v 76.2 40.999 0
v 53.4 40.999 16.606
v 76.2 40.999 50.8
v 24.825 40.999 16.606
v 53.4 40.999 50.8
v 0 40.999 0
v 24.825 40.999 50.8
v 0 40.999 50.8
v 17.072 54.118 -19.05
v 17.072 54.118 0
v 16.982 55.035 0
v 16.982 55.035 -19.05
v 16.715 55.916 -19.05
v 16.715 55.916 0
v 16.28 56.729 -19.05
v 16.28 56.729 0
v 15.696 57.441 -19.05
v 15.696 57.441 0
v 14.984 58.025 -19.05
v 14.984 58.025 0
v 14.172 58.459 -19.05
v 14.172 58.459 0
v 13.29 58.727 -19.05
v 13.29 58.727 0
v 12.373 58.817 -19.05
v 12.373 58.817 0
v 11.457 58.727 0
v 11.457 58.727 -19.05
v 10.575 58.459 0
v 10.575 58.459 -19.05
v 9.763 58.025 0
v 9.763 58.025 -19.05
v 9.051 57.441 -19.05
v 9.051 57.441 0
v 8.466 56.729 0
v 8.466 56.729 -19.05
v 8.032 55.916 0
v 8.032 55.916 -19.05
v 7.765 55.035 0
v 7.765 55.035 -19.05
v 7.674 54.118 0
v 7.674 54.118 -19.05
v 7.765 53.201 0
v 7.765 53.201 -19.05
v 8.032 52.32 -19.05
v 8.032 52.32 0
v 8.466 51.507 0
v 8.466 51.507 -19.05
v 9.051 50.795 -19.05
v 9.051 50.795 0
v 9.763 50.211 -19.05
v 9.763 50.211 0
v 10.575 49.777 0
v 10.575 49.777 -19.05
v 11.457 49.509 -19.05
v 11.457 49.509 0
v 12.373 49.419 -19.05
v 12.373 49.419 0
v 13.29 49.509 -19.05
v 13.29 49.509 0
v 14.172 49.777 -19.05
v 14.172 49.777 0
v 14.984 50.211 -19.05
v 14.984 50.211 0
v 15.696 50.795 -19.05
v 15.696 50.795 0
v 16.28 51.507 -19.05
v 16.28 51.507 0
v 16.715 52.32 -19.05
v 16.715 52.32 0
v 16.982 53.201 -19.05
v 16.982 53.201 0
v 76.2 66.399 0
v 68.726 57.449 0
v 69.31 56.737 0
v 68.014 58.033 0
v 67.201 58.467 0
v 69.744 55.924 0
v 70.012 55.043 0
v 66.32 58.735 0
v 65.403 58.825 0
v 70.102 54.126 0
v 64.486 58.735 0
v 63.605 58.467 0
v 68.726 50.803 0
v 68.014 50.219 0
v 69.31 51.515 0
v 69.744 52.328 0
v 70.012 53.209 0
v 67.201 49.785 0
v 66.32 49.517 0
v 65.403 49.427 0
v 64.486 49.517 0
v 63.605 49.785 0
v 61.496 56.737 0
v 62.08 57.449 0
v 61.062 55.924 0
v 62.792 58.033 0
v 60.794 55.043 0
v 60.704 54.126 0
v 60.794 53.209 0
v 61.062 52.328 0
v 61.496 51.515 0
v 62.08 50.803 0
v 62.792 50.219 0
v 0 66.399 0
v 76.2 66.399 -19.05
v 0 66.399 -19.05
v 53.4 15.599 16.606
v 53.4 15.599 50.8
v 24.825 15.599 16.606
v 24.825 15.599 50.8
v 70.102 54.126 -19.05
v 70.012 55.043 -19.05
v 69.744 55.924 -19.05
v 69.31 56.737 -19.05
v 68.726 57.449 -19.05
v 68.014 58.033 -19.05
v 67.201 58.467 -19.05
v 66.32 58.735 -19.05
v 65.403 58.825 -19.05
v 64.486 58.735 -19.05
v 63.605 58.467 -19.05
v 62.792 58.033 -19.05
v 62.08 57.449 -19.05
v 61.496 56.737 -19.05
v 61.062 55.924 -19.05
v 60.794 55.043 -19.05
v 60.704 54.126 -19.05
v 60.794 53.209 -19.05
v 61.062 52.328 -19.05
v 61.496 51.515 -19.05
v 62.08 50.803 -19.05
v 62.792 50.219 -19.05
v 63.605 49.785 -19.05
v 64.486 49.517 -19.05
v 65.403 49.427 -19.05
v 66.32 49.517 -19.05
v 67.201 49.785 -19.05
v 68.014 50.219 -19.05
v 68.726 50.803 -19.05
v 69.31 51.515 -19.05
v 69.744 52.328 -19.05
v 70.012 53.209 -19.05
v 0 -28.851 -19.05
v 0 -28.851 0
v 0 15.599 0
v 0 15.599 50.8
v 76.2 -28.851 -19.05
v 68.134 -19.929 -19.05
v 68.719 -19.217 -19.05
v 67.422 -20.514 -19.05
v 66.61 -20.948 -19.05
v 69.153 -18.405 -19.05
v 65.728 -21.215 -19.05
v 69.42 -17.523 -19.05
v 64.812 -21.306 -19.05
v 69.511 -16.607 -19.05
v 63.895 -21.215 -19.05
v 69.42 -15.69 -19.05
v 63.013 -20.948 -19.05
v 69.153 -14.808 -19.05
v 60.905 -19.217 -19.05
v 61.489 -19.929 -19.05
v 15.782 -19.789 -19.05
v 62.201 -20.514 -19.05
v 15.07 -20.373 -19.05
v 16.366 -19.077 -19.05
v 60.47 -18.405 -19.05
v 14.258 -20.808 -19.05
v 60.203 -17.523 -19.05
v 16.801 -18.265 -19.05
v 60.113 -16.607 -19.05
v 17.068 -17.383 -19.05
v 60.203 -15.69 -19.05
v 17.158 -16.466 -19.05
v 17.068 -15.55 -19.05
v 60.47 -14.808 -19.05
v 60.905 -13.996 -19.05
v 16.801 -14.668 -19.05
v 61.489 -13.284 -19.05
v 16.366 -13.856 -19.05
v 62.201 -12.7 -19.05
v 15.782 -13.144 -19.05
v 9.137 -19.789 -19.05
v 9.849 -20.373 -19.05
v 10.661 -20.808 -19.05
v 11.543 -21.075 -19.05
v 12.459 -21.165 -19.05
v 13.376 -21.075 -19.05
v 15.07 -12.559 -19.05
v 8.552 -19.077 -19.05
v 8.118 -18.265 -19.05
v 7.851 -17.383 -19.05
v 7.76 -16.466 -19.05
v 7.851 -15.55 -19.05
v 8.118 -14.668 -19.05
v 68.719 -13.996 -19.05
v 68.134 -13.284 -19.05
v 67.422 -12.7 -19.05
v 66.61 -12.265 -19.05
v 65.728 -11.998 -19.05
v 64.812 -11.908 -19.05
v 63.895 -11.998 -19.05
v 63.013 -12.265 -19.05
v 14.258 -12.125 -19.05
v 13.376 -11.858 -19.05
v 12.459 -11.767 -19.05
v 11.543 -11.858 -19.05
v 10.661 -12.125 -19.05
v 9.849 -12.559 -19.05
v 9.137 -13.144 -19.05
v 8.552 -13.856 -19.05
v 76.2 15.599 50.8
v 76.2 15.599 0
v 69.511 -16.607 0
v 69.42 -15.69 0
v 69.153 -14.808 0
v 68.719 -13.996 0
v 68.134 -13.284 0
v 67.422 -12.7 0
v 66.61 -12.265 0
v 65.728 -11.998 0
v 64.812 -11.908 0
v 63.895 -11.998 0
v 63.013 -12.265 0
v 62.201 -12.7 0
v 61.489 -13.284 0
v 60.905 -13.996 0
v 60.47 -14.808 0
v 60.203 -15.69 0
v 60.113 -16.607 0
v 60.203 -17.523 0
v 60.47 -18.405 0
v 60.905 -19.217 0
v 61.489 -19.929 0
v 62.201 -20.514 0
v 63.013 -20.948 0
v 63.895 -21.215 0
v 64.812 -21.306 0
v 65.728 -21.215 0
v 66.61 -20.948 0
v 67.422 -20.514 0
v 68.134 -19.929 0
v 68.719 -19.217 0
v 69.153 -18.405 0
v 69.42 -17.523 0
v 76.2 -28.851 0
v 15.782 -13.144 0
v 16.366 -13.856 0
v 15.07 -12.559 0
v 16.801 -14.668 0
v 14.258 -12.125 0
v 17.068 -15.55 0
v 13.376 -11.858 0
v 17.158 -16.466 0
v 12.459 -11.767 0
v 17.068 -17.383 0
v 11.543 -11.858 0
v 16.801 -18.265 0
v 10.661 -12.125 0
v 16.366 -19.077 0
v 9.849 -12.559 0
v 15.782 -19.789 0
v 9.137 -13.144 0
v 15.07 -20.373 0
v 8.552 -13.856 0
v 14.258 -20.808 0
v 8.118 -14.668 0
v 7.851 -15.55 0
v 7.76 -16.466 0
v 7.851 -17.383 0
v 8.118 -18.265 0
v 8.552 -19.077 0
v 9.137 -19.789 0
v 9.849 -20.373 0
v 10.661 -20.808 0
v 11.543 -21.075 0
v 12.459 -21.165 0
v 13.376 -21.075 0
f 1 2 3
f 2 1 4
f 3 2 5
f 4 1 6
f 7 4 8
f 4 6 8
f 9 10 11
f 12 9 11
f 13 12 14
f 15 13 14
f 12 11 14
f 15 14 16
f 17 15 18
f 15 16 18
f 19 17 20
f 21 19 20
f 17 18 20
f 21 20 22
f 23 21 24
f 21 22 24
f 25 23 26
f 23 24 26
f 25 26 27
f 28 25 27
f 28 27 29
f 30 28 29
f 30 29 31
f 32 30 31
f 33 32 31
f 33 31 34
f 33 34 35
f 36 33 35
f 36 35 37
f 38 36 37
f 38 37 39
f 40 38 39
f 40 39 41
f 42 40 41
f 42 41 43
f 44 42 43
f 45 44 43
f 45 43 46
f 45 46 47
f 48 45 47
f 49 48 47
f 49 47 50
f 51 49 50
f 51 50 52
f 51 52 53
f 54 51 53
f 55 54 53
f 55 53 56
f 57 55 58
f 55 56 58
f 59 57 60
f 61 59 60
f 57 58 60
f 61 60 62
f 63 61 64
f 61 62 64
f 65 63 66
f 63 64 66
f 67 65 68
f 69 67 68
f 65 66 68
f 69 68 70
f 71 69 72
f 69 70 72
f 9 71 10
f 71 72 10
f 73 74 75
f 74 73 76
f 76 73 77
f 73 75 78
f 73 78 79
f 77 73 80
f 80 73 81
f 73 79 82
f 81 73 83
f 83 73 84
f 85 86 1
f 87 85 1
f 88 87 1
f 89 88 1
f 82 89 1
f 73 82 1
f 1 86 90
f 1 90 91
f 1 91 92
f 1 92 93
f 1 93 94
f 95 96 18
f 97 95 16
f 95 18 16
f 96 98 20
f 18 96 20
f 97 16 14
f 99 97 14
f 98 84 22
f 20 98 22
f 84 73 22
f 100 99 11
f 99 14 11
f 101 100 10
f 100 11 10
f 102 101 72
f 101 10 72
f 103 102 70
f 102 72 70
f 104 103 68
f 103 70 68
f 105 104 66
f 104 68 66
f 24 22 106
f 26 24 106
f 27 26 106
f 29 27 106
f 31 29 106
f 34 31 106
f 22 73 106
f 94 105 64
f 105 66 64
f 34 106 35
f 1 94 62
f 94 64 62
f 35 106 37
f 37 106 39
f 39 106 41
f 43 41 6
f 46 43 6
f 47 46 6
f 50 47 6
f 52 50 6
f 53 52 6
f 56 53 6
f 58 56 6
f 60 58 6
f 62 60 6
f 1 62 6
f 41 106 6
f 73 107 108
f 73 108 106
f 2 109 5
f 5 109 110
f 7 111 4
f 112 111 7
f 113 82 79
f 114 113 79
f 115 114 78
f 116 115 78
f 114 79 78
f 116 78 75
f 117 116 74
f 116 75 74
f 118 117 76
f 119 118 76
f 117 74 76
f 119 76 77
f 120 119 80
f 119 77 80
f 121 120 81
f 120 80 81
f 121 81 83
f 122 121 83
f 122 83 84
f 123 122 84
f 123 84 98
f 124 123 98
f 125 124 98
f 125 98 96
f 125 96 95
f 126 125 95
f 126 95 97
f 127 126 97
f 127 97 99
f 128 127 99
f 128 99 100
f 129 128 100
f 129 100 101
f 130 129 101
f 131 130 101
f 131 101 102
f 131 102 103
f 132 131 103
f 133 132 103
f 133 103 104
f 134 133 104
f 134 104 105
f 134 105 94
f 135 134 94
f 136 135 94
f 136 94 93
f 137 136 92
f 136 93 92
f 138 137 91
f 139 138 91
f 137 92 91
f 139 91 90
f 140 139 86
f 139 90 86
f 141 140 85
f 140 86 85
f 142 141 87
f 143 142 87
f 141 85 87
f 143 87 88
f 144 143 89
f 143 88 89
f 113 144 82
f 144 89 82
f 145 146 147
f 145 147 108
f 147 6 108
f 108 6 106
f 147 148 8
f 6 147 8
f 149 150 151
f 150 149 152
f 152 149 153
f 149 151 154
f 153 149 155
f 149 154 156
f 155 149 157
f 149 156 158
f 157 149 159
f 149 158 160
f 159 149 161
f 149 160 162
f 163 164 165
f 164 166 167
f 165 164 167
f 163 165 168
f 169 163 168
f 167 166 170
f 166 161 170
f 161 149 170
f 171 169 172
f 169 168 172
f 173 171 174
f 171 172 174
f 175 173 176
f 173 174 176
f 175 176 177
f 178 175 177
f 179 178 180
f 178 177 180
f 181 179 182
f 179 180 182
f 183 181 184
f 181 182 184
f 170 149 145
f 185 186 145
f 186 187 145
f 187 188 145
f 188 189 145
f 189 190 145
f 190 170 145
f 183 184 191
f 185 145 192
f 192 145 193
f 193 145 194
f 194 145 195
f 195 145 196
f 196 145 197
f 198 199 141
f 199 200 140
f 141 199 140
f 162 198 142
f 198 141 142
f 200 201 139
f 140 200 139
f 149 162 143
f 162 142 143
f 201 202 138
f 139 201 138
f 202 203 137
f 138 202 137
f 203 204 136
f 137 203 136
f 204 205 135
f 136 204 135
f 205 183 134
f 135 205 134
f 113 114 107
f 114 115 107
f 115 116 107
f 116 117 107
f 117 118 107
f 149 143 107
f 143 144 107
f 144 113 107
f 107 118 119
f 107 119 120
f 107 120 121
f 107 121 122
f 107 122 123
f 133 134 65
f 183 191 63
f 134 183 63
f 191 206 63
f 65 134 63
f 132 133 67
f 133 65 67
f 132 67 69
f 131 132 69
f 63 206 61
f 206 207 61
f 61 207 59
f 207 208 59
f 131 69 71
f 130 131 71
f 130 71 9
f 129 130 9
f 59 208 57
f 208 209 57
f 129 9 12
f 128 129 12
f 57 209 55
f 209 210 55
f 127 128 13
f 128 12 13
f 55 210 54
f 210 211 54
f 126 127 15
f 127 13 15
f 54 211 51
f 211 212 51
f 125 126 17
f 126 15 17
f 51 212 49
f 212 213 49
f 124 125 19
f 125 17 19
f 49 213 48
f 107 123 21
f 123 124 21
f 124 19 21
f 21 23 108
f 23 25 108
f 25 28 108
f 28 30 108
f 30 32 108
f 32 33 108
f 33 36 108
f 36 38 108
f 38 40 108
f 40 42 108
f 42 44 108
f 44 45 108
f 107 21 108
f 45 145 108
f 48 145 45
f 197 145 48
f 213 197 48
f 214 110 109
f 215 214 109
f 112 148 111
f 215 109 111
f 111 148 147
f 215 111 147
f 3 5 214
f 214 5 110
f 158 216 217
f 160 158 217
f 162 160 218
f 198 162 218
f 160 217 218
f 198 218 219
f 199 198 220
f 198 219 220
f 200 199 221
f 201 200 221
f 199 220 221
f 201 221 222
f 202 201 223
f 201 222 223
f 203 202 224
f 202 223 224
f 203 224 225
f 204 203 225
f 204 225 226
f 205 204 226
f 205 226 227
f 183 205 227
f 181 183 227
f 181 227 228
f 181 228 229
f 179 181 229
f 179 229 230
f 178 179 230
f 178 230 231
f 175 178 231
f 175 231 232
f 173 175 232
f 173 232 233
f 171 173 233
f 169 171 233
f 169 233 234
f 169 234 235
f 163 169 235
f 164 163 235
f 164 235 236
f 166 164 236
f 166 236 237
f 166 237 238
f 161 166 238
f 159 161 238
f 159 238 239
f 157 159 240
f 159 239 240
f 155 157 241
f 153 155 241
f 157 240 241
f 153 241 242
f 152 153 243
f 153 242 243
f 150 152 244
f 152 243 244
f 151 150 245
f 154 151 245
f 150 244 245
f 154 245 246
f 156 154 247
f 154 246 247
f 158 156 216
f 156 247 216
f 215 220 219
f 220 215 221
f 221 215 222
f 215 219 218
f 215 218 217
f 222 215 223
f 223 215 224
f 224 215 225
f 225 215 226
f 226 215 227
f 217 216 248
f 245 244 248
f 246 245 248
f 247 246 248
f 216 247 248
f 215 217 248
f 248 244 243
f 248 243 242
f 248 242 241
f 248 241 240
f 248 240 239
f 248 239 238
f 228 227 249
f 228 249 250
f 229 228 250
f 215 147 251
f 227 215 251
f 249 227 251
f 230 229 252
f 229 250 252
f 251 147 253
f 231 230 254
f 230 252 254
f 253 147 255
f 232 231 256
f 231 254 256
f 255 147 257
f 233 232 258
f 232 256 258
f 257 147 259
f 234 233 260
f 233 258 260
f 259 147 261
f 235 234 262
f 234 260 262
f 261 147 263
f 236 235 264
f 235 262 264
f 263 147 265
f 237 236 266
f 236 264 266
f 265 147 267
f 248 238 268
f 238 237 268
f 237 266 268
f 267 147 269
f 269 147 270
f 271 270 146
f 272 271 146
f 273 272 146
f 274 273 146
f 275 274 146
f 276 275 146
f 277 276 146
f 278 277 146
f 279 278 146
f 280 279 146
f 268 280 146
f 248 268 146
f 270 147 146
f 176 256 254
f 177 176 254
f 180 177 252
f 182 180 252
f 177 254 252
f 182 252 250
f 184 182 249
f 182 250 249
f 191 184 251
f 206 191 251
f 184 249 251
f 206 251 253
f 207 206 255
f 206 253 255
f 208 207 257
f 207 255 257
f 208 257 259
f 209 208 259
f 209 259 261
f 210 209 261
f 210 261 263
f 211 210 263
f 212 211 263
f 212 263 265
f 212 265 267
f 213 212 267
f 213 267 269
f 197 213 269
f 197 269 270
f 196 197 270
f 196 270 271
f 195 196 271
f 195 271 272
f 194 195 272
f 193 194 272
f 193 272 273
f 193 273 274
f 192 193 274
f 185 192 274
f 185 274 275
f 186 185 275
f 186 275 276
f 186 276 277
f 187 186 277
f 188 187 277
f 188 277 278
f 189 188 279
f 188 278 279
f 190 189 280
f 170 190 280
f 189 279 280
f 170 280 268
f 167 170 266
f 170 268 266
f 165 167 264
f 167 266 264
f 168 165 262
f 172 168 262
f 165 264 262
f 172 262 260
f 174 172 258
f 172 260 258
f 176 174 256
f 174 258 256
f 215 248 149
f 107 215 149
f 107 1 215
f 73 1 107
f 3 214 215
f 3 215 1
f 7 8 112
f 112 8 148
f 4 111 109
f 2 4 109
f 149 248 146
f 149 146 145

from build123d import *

# Parameters (mm, degrees)
F1_DEPTH = 76.2
F2_W     = 28.575
F2_H     = 34.19415
F3_DEPTH = 33.782
F4_R     = 4.699
F5_DEPTH = 53.594


with BuildPart() as f1:
    # F0 (on Right) → F1 (new body)
    with BuildSketch(Plane.YZ):
        Polygon((-28.850567, 0), (-28.850567, -19.05), (66.399433, -19.05), (66.399433, 0), (40.999433, 0), (40.999433, 50.8), (15.599433, 50.8), (15.599433, 0), align=None)
    extrude(amount=F1_DEPTH)

    # F2 (on face) → F3 (cut)
    with BuildSketch(Plane.XZ.offset(-15.599433)):
        with Locations((39.112404, 33.702925)):
            Rectangle(F2_W, F2_H)
    extrude(amount=-F3_DEPTH, mode=Mode.SUBTRACT)

    # F4 (on face) → F5 (cut)
    with BuildSketch(Plane.XY):
        with Locations((12.373271, 54.11797)):
            Circle(F4_R)
        with Locations((65.402929, 54.126016)):
            Circle(F4_R)
        with Locations((12.459423, -16.466378)):
            Circle(F4_R)
        with Locations((64.811589, -16.606646)):
            Circle(F4_R)
    extrude(amount=-F5_DEPTH, mode=Mode.SUBTRACT)


solid = f1.part
